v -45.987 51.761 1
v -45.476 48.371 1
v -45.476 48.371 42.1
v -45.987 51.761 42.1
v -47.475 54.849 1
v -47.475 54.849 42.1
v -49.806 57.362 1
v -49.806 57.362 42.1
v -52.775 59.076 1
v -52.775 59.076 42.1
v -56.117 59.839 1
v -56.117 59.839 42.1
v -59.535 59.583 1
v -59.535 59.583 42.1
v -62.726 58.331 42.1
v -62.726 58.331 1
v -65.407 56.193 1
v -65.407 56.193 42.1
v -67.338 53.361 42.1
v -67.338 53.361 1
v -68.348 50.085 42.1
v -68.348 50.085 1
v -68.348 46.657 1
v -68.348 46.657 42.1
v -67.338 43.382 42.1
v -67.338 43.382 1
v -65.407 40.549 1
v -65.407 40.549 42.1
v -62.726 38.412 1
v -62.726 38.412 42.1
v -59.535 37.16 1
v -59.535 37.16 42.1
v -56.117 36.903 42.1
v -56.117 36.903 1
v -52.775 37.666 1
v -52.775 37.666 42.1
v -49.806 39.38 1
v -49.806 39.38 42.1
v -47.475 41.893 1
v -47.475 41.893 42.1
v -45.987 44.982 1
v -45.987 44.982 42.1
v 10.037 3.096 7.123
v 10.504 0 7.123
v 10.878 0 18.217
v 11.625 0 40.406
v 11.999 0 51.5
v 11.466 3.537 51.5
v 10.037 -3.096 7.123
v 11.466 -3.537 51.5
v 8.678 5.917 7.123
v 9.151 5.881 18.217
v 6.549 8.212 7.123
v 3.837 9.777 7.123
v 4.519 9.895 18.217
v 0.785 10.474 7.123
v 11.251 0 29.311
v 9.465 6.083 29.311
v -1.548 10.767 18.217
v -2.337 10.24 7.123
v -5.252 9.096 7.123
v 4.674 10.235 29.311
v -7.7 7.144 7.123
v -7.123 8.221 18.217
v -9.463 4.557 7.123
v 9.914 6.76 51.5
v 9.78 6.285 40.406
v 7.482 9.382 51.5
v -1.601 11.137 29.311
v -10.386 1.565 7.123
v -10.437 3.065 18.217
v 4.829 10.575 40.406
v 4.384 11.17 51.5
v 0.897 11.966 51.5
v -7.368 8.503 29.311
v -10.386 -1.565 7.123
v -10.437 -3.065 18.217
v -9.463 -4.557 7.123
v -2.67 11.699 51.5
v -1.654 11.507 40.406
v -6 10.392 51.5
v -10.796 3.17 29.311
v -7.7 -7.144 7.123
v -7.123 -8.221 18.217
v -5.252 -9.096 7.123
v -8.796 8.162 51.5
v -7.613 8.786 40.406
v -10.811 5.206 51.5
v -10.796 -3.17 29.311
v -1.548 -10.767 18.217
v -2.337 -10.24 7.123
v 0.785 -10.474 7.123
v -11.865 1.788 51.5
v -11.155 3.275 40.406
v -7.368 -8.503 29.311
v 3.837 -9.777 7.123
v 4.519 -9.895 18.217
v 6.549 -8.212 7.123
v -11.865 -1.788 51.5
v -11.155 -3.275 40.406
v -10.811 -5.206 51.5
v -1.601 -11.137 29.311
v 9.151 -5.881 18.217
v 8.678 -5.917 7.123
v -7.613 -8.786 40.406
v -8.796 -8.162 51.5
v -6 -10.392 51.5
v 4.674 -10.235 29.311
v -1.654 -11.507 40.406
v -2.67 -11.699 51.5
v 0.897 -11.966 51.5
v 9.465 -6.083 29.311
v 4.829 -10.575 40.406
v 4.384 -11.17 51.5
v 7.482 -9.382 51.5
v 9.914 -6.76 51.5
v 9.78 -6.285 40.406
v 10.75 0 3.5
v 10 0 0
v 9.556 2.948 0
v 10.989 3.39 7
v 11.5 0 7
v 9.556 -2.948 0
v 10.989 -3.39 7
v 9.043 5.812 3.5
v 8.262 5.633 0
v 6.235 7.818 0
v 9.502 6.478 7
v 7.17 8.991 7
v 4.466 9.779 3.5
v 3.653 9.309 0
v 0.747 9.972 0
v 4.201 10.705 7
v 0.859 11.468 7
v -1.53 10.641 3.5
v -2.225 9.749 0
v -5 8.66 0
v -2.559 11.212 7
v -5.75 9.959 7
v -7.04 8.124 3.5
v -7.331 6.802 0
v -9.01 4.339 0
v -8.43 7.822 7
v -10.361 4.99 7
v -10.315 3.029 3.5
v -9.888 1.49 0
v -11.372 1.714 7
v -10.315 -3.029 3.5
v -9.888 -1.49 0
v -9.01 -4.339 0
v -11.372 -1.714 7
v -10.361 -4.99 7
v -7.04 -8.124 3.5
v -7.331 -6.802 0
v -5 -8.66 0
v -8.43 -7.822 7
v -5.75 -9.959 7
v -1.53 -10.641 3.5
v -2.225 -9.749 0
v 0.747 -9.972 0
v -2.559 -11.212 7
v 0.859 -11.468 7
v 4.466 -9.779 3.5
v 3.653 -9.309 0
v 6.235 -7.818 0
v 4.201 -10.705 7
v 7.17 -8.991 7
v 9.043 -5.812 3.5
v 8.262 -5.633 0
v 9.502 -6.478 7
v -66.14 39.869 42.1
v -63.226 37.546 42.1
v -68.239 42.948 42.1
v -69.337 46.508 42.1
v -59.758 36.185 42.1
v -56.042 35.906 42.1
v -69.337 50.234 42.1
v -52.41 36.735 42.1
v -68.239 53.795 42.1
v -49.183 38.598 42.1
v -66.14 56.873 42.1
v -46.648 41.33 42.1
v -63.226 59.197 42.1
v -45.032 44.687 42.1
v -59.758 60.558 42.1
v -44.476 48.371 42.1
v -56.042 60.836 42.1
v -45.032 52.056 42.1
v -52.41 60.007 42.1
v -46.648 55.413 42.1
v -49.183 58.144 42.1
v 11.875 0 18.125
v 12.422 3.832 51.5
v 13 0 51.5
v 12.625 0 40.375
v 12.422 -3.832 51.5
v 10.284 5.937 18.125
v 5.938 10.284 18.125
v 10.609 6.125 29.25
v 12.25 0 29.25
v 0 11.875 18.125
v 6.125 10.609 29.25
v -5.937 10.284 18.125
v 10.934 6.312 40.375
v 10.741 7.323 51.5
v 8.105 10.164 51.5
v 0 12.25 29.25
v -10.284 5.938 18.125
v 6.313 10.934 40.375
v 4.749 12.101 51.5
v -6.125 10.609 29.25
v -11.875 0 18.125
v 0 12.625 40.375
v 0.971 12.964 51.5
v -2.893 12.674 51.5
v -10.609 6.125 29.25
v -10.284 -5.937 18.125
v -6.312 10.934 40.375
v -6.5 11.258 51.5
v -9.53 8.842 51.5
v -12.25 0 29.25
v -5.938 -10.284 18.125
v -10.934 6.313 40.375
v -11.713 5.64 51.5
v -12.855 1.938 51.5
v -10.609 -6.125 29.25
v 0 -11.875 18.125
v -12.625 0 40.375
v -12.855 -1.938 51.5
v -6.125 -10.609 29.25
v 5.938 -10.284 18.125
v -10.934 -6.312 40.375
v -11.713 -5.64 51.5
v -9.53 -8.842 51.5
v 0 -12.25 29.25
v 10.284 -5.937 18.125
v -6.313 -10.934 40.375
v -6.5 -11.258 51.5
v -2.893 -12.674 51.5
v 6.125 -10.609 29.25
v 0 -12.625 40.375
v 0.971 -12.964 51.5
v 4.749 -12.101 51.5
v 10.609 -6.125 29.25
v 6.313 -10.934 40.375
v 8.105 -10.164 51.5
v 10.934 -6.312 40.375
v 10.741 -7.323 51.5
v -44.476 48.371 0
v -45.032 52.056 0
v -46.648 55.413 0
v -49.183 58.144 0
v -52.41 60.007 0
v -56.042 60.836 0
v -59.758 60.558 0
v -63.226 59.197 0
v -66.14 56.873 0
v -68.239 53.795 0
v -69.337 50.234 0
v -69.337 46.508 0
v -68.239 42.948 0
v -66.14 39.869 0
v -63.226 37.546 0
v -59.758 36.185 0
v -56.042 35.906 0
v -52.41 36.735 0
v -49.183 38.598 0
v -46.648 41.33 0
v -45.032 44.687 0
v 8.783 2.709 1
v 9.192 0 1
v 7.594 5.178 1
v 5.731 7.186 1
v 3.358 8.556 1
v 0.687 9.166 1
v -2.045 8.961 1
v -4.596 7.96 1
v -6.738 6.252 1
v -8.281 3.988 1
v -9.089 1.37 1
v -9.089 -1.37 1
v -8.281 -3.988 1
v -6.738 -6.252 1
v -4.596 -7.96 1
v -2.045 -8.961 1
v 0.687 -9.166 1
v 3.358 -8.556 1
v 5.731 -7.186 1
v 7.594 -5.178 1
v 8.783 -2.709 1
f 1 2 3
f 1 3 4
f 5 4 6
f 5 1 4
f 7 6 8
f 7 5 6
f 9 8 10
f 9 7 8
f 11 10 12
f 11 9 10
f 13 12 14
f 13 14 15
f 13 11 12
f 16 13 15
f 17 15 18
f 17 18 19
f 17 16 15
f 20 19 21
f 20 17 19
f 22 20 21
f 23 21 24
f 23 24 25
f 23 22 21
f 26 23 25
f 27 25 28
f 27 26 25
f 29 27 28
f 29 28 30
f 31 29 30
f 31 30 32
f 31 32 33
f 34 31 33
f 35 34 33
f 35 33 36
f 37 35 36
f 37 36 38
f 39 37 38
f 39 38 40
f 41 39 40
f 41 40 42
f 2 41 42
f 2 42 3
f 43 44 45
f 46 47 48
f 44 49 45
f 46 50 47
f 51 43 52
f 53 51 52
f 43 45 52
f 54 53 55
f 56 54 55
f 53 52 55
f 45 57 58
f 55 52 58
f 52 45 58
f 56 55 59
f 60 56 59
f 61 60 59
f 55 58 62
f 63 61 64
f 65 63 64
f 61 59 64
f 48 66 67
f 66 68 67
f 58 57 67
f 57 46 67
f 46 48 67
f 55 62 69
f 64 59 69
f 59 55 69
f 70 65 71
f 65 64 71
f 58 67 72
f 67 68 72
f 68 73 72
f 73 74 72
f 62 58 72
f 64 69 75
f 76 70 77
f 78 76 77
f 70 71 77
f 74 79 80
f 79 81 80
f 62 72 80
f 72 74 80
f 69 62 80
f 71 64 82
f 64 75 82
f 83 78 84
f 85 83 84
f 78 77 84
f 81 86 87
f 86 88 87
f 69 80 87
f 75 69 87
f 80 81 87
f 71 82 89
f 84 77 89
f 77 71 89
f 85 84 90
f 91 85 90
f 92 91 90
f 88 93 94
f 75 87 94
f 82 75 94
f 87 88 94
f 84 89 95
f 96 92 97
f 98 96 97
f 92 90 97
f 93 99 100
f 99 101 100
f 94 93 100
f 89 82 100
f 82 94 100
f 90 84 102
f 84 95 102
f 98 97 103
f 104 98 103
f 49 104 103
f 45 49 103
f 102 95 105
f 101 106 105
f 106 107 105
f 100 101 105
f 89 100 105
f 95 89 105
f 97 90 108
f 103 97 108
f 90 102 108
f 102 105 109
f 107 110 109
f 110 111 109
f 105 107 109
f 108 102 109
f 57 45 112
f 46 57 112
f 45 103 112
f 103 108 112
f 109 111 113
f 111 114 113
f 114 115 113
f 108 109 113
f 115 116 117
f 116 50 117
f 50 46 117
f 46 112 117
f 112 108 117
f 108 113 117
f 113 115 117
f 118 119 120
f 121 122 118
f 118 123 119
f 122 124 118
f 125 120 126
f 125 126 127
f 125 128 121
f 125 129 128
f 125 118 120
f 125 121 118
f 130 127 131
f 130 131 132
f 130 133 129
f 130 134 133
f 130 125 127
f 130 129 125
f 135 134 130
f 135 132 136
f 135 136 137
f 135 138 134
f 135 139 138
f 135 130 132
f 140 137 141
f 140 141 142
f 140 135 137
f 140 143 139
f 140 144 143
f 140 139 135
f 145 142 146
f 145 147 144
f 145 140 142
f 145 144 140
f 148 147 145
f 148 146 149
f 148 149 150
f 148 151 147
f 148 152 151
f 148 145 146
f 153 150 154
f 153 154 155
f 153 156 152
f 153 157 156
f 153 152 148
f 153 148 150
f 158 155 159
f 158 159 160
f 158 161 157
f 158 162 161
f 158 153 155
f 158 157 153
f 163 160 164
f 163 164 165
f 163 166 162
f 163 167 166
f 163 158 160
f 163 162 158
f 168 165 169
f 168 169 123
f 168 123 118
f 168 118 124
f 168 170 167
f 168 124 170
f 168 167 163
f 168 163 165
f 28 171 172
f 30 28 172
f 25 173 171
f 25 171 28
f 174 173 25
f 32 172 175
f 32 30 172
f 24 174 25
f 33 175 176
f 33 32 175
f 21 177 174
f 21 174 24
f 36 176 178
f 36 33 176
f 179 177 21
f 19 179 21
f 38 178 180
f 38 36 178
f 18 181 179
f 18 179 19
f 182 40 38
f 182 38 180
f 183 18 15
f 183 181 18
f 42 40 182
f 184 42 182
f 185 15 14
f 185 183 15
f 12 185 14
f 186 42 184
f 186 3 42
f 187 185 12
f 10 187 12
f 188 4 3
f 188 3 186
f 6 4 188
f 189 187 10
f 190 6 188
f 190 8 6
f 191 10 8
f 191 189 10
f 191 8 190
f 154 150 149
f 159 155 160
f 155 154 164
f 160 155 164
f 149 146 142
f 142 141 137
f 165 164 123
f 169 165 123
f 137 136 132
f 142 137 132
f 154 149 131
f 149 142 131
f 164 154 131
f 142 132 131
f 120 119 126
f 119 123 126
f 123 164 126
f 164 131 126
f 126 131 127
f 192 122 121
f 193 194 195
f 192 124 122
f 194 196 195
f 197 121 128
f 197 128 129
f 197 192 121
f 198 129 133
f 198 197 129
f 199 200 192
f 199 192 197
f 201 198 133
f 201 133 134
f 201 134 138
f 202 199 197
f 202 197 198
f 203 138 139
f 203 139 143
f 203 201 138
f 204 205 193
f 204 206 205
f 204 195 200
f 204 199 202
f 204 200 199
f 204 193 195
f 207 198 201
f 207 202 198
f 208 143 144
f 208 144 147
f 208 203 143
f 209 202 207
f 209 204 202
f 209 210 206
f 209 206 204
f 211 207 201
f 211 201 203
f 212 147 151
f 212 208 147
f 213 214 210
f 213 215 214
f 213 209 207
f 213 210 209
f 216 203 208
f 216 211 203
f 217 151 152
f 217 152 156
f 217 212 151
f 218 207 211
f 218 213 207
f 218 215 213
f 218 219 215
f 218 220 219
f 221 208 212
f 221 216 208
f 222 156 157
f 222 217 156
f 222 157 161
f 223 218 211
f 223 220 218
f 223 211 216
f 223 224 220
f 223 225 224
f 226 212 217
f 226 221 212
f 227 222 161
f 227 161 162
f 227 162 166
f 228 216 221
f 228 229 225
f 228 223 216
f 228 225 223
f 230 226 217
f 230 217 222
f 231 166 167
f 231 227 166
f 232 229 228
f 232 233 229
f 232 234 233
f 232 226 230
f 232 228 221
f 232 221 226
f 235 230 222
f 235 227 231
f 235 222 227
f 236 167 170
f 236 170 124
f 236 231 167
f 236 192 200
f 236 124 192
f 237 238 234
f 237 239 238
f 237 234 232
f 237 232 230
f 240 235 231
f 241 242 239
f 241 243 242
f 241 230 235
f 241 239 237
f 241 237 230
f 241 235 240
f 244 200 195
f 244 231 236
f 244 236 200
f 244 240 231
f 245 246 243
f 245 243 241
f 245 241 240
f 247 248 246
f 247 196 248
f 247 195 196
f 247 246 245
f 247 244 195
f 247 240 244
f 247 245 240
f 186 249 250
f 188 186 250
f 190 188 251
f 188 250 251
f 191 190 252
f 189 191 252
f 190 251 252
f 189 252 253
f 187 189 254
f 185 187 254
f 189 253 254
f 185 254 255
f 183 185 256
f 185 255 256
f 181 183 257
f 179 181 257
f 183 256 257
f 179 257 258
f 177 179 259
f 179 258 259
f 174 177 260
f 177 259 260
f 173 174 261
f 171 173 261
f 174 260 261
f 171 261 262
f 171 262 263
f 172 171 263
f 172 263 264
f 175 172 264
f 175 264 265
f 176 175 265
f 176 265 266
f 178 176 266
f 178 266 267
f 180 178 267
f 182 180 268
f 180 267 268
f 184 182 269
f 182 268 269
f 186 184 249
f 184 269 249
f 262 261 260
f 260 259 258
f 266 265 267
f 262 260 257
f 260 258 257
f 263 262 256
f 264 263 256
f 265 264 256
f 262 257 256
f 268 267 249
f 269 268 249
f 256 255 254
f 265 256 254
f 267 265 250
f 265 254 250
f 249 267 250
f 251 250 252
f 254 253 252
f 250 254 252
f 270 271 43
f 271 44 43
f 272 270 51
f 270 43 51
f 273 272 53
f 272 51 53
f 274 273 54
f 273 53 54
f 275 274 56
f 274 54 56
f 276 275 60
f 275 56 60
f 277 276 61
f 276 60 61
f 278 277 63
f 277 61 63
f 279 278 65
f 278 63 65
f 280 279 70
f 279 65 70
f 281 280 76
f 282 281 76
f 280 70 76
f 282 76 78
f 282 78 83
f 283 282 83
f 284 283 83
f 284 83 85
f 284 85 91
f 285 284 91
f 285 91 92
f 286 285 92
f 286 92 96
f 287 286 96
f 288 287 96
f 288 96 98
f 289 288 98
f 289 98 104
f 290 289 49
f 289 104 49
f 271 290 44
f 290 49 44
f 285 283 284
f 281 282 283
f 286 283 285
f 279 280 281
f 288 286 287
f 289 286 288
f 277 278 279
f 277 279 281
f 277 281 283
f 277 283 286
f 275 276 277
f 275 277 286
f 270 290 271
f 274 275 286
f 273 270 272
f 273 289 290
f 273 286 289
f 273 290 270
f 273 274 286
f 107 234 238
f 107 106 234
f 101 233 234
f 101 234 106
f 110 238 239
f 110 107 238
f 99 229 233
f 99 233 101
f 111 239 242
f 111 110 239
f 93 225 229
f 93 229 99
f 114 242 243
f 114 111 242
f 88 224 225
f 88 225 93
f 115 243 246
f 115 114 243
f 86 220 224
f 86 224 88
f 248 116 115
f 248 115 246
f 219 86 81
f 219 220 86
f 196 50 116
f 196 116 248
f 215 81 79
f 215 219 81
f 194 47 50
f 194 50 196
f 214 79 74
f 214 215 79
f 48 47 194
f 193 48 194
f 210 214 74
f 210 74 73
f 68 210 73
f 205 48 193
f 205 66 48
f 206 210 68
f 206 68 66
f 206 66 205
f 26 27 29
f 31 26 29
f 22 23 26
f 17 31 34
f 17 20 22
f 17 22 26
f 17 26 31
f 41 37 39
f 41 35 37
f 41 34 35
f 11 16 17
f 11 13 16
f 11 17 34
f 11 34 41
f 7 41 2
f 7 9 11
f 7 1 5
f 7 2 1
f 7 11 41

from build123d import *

# Parameters (mm, degrees)
F0_R      = 10
F2_R      = 11.5
F4_R      = 11.5
F6_R      = 13
F8_T      = -1
F9_R      = 12.5
F10_DEPTH = 42.1
F11_T     = -1


with BuildPart() as f3:
    # F0 (on Top) → F3 section 0
    with BuildSketch(Plane.XY):
        Circle(F0_R)
    # F2 (on offset) → F3 section 1
    with BuildSketch(Plane.XY.offset(7)):
        Circle(F2_R)
    loft()

    # F4 (on face) → F7 section 0
    with BuildSketch(Plane.XY.offset(7)):
        Circle(F4_R)
    # F6 (on offset) → F7 section 1
    with BuildSketch(Plane.XY.offset(51.5)):
        Circle(F6_R)
    loft()

    # F8
    f8_openings = [f3.faces().sort_by_distance(p)[0] for p in [
        (0, 0, 51.5),
    ]]
    offset(amount=F8_T, openings=f8_openings, kind=Kind.INTERSECTION)


with BuildPart() as f10:
    # F9 (on Top) → F10 (new body)
    with BuildSketch(Plane.XY):
        with Locations((-56.9764077663, 48.3712740242)):
            Circle(F9_R)
    extrude(amount=F10_DEPTH)

    # F11
    f11_openings = [f10.faces().sort_by_distance(p)[0] for p in [
        (-56.976408, 48.371274, 42.1),
    ]]
    offset(amount=F11_T, openings=f11_openings)


solid = Compound([f3.part, f10.part])
